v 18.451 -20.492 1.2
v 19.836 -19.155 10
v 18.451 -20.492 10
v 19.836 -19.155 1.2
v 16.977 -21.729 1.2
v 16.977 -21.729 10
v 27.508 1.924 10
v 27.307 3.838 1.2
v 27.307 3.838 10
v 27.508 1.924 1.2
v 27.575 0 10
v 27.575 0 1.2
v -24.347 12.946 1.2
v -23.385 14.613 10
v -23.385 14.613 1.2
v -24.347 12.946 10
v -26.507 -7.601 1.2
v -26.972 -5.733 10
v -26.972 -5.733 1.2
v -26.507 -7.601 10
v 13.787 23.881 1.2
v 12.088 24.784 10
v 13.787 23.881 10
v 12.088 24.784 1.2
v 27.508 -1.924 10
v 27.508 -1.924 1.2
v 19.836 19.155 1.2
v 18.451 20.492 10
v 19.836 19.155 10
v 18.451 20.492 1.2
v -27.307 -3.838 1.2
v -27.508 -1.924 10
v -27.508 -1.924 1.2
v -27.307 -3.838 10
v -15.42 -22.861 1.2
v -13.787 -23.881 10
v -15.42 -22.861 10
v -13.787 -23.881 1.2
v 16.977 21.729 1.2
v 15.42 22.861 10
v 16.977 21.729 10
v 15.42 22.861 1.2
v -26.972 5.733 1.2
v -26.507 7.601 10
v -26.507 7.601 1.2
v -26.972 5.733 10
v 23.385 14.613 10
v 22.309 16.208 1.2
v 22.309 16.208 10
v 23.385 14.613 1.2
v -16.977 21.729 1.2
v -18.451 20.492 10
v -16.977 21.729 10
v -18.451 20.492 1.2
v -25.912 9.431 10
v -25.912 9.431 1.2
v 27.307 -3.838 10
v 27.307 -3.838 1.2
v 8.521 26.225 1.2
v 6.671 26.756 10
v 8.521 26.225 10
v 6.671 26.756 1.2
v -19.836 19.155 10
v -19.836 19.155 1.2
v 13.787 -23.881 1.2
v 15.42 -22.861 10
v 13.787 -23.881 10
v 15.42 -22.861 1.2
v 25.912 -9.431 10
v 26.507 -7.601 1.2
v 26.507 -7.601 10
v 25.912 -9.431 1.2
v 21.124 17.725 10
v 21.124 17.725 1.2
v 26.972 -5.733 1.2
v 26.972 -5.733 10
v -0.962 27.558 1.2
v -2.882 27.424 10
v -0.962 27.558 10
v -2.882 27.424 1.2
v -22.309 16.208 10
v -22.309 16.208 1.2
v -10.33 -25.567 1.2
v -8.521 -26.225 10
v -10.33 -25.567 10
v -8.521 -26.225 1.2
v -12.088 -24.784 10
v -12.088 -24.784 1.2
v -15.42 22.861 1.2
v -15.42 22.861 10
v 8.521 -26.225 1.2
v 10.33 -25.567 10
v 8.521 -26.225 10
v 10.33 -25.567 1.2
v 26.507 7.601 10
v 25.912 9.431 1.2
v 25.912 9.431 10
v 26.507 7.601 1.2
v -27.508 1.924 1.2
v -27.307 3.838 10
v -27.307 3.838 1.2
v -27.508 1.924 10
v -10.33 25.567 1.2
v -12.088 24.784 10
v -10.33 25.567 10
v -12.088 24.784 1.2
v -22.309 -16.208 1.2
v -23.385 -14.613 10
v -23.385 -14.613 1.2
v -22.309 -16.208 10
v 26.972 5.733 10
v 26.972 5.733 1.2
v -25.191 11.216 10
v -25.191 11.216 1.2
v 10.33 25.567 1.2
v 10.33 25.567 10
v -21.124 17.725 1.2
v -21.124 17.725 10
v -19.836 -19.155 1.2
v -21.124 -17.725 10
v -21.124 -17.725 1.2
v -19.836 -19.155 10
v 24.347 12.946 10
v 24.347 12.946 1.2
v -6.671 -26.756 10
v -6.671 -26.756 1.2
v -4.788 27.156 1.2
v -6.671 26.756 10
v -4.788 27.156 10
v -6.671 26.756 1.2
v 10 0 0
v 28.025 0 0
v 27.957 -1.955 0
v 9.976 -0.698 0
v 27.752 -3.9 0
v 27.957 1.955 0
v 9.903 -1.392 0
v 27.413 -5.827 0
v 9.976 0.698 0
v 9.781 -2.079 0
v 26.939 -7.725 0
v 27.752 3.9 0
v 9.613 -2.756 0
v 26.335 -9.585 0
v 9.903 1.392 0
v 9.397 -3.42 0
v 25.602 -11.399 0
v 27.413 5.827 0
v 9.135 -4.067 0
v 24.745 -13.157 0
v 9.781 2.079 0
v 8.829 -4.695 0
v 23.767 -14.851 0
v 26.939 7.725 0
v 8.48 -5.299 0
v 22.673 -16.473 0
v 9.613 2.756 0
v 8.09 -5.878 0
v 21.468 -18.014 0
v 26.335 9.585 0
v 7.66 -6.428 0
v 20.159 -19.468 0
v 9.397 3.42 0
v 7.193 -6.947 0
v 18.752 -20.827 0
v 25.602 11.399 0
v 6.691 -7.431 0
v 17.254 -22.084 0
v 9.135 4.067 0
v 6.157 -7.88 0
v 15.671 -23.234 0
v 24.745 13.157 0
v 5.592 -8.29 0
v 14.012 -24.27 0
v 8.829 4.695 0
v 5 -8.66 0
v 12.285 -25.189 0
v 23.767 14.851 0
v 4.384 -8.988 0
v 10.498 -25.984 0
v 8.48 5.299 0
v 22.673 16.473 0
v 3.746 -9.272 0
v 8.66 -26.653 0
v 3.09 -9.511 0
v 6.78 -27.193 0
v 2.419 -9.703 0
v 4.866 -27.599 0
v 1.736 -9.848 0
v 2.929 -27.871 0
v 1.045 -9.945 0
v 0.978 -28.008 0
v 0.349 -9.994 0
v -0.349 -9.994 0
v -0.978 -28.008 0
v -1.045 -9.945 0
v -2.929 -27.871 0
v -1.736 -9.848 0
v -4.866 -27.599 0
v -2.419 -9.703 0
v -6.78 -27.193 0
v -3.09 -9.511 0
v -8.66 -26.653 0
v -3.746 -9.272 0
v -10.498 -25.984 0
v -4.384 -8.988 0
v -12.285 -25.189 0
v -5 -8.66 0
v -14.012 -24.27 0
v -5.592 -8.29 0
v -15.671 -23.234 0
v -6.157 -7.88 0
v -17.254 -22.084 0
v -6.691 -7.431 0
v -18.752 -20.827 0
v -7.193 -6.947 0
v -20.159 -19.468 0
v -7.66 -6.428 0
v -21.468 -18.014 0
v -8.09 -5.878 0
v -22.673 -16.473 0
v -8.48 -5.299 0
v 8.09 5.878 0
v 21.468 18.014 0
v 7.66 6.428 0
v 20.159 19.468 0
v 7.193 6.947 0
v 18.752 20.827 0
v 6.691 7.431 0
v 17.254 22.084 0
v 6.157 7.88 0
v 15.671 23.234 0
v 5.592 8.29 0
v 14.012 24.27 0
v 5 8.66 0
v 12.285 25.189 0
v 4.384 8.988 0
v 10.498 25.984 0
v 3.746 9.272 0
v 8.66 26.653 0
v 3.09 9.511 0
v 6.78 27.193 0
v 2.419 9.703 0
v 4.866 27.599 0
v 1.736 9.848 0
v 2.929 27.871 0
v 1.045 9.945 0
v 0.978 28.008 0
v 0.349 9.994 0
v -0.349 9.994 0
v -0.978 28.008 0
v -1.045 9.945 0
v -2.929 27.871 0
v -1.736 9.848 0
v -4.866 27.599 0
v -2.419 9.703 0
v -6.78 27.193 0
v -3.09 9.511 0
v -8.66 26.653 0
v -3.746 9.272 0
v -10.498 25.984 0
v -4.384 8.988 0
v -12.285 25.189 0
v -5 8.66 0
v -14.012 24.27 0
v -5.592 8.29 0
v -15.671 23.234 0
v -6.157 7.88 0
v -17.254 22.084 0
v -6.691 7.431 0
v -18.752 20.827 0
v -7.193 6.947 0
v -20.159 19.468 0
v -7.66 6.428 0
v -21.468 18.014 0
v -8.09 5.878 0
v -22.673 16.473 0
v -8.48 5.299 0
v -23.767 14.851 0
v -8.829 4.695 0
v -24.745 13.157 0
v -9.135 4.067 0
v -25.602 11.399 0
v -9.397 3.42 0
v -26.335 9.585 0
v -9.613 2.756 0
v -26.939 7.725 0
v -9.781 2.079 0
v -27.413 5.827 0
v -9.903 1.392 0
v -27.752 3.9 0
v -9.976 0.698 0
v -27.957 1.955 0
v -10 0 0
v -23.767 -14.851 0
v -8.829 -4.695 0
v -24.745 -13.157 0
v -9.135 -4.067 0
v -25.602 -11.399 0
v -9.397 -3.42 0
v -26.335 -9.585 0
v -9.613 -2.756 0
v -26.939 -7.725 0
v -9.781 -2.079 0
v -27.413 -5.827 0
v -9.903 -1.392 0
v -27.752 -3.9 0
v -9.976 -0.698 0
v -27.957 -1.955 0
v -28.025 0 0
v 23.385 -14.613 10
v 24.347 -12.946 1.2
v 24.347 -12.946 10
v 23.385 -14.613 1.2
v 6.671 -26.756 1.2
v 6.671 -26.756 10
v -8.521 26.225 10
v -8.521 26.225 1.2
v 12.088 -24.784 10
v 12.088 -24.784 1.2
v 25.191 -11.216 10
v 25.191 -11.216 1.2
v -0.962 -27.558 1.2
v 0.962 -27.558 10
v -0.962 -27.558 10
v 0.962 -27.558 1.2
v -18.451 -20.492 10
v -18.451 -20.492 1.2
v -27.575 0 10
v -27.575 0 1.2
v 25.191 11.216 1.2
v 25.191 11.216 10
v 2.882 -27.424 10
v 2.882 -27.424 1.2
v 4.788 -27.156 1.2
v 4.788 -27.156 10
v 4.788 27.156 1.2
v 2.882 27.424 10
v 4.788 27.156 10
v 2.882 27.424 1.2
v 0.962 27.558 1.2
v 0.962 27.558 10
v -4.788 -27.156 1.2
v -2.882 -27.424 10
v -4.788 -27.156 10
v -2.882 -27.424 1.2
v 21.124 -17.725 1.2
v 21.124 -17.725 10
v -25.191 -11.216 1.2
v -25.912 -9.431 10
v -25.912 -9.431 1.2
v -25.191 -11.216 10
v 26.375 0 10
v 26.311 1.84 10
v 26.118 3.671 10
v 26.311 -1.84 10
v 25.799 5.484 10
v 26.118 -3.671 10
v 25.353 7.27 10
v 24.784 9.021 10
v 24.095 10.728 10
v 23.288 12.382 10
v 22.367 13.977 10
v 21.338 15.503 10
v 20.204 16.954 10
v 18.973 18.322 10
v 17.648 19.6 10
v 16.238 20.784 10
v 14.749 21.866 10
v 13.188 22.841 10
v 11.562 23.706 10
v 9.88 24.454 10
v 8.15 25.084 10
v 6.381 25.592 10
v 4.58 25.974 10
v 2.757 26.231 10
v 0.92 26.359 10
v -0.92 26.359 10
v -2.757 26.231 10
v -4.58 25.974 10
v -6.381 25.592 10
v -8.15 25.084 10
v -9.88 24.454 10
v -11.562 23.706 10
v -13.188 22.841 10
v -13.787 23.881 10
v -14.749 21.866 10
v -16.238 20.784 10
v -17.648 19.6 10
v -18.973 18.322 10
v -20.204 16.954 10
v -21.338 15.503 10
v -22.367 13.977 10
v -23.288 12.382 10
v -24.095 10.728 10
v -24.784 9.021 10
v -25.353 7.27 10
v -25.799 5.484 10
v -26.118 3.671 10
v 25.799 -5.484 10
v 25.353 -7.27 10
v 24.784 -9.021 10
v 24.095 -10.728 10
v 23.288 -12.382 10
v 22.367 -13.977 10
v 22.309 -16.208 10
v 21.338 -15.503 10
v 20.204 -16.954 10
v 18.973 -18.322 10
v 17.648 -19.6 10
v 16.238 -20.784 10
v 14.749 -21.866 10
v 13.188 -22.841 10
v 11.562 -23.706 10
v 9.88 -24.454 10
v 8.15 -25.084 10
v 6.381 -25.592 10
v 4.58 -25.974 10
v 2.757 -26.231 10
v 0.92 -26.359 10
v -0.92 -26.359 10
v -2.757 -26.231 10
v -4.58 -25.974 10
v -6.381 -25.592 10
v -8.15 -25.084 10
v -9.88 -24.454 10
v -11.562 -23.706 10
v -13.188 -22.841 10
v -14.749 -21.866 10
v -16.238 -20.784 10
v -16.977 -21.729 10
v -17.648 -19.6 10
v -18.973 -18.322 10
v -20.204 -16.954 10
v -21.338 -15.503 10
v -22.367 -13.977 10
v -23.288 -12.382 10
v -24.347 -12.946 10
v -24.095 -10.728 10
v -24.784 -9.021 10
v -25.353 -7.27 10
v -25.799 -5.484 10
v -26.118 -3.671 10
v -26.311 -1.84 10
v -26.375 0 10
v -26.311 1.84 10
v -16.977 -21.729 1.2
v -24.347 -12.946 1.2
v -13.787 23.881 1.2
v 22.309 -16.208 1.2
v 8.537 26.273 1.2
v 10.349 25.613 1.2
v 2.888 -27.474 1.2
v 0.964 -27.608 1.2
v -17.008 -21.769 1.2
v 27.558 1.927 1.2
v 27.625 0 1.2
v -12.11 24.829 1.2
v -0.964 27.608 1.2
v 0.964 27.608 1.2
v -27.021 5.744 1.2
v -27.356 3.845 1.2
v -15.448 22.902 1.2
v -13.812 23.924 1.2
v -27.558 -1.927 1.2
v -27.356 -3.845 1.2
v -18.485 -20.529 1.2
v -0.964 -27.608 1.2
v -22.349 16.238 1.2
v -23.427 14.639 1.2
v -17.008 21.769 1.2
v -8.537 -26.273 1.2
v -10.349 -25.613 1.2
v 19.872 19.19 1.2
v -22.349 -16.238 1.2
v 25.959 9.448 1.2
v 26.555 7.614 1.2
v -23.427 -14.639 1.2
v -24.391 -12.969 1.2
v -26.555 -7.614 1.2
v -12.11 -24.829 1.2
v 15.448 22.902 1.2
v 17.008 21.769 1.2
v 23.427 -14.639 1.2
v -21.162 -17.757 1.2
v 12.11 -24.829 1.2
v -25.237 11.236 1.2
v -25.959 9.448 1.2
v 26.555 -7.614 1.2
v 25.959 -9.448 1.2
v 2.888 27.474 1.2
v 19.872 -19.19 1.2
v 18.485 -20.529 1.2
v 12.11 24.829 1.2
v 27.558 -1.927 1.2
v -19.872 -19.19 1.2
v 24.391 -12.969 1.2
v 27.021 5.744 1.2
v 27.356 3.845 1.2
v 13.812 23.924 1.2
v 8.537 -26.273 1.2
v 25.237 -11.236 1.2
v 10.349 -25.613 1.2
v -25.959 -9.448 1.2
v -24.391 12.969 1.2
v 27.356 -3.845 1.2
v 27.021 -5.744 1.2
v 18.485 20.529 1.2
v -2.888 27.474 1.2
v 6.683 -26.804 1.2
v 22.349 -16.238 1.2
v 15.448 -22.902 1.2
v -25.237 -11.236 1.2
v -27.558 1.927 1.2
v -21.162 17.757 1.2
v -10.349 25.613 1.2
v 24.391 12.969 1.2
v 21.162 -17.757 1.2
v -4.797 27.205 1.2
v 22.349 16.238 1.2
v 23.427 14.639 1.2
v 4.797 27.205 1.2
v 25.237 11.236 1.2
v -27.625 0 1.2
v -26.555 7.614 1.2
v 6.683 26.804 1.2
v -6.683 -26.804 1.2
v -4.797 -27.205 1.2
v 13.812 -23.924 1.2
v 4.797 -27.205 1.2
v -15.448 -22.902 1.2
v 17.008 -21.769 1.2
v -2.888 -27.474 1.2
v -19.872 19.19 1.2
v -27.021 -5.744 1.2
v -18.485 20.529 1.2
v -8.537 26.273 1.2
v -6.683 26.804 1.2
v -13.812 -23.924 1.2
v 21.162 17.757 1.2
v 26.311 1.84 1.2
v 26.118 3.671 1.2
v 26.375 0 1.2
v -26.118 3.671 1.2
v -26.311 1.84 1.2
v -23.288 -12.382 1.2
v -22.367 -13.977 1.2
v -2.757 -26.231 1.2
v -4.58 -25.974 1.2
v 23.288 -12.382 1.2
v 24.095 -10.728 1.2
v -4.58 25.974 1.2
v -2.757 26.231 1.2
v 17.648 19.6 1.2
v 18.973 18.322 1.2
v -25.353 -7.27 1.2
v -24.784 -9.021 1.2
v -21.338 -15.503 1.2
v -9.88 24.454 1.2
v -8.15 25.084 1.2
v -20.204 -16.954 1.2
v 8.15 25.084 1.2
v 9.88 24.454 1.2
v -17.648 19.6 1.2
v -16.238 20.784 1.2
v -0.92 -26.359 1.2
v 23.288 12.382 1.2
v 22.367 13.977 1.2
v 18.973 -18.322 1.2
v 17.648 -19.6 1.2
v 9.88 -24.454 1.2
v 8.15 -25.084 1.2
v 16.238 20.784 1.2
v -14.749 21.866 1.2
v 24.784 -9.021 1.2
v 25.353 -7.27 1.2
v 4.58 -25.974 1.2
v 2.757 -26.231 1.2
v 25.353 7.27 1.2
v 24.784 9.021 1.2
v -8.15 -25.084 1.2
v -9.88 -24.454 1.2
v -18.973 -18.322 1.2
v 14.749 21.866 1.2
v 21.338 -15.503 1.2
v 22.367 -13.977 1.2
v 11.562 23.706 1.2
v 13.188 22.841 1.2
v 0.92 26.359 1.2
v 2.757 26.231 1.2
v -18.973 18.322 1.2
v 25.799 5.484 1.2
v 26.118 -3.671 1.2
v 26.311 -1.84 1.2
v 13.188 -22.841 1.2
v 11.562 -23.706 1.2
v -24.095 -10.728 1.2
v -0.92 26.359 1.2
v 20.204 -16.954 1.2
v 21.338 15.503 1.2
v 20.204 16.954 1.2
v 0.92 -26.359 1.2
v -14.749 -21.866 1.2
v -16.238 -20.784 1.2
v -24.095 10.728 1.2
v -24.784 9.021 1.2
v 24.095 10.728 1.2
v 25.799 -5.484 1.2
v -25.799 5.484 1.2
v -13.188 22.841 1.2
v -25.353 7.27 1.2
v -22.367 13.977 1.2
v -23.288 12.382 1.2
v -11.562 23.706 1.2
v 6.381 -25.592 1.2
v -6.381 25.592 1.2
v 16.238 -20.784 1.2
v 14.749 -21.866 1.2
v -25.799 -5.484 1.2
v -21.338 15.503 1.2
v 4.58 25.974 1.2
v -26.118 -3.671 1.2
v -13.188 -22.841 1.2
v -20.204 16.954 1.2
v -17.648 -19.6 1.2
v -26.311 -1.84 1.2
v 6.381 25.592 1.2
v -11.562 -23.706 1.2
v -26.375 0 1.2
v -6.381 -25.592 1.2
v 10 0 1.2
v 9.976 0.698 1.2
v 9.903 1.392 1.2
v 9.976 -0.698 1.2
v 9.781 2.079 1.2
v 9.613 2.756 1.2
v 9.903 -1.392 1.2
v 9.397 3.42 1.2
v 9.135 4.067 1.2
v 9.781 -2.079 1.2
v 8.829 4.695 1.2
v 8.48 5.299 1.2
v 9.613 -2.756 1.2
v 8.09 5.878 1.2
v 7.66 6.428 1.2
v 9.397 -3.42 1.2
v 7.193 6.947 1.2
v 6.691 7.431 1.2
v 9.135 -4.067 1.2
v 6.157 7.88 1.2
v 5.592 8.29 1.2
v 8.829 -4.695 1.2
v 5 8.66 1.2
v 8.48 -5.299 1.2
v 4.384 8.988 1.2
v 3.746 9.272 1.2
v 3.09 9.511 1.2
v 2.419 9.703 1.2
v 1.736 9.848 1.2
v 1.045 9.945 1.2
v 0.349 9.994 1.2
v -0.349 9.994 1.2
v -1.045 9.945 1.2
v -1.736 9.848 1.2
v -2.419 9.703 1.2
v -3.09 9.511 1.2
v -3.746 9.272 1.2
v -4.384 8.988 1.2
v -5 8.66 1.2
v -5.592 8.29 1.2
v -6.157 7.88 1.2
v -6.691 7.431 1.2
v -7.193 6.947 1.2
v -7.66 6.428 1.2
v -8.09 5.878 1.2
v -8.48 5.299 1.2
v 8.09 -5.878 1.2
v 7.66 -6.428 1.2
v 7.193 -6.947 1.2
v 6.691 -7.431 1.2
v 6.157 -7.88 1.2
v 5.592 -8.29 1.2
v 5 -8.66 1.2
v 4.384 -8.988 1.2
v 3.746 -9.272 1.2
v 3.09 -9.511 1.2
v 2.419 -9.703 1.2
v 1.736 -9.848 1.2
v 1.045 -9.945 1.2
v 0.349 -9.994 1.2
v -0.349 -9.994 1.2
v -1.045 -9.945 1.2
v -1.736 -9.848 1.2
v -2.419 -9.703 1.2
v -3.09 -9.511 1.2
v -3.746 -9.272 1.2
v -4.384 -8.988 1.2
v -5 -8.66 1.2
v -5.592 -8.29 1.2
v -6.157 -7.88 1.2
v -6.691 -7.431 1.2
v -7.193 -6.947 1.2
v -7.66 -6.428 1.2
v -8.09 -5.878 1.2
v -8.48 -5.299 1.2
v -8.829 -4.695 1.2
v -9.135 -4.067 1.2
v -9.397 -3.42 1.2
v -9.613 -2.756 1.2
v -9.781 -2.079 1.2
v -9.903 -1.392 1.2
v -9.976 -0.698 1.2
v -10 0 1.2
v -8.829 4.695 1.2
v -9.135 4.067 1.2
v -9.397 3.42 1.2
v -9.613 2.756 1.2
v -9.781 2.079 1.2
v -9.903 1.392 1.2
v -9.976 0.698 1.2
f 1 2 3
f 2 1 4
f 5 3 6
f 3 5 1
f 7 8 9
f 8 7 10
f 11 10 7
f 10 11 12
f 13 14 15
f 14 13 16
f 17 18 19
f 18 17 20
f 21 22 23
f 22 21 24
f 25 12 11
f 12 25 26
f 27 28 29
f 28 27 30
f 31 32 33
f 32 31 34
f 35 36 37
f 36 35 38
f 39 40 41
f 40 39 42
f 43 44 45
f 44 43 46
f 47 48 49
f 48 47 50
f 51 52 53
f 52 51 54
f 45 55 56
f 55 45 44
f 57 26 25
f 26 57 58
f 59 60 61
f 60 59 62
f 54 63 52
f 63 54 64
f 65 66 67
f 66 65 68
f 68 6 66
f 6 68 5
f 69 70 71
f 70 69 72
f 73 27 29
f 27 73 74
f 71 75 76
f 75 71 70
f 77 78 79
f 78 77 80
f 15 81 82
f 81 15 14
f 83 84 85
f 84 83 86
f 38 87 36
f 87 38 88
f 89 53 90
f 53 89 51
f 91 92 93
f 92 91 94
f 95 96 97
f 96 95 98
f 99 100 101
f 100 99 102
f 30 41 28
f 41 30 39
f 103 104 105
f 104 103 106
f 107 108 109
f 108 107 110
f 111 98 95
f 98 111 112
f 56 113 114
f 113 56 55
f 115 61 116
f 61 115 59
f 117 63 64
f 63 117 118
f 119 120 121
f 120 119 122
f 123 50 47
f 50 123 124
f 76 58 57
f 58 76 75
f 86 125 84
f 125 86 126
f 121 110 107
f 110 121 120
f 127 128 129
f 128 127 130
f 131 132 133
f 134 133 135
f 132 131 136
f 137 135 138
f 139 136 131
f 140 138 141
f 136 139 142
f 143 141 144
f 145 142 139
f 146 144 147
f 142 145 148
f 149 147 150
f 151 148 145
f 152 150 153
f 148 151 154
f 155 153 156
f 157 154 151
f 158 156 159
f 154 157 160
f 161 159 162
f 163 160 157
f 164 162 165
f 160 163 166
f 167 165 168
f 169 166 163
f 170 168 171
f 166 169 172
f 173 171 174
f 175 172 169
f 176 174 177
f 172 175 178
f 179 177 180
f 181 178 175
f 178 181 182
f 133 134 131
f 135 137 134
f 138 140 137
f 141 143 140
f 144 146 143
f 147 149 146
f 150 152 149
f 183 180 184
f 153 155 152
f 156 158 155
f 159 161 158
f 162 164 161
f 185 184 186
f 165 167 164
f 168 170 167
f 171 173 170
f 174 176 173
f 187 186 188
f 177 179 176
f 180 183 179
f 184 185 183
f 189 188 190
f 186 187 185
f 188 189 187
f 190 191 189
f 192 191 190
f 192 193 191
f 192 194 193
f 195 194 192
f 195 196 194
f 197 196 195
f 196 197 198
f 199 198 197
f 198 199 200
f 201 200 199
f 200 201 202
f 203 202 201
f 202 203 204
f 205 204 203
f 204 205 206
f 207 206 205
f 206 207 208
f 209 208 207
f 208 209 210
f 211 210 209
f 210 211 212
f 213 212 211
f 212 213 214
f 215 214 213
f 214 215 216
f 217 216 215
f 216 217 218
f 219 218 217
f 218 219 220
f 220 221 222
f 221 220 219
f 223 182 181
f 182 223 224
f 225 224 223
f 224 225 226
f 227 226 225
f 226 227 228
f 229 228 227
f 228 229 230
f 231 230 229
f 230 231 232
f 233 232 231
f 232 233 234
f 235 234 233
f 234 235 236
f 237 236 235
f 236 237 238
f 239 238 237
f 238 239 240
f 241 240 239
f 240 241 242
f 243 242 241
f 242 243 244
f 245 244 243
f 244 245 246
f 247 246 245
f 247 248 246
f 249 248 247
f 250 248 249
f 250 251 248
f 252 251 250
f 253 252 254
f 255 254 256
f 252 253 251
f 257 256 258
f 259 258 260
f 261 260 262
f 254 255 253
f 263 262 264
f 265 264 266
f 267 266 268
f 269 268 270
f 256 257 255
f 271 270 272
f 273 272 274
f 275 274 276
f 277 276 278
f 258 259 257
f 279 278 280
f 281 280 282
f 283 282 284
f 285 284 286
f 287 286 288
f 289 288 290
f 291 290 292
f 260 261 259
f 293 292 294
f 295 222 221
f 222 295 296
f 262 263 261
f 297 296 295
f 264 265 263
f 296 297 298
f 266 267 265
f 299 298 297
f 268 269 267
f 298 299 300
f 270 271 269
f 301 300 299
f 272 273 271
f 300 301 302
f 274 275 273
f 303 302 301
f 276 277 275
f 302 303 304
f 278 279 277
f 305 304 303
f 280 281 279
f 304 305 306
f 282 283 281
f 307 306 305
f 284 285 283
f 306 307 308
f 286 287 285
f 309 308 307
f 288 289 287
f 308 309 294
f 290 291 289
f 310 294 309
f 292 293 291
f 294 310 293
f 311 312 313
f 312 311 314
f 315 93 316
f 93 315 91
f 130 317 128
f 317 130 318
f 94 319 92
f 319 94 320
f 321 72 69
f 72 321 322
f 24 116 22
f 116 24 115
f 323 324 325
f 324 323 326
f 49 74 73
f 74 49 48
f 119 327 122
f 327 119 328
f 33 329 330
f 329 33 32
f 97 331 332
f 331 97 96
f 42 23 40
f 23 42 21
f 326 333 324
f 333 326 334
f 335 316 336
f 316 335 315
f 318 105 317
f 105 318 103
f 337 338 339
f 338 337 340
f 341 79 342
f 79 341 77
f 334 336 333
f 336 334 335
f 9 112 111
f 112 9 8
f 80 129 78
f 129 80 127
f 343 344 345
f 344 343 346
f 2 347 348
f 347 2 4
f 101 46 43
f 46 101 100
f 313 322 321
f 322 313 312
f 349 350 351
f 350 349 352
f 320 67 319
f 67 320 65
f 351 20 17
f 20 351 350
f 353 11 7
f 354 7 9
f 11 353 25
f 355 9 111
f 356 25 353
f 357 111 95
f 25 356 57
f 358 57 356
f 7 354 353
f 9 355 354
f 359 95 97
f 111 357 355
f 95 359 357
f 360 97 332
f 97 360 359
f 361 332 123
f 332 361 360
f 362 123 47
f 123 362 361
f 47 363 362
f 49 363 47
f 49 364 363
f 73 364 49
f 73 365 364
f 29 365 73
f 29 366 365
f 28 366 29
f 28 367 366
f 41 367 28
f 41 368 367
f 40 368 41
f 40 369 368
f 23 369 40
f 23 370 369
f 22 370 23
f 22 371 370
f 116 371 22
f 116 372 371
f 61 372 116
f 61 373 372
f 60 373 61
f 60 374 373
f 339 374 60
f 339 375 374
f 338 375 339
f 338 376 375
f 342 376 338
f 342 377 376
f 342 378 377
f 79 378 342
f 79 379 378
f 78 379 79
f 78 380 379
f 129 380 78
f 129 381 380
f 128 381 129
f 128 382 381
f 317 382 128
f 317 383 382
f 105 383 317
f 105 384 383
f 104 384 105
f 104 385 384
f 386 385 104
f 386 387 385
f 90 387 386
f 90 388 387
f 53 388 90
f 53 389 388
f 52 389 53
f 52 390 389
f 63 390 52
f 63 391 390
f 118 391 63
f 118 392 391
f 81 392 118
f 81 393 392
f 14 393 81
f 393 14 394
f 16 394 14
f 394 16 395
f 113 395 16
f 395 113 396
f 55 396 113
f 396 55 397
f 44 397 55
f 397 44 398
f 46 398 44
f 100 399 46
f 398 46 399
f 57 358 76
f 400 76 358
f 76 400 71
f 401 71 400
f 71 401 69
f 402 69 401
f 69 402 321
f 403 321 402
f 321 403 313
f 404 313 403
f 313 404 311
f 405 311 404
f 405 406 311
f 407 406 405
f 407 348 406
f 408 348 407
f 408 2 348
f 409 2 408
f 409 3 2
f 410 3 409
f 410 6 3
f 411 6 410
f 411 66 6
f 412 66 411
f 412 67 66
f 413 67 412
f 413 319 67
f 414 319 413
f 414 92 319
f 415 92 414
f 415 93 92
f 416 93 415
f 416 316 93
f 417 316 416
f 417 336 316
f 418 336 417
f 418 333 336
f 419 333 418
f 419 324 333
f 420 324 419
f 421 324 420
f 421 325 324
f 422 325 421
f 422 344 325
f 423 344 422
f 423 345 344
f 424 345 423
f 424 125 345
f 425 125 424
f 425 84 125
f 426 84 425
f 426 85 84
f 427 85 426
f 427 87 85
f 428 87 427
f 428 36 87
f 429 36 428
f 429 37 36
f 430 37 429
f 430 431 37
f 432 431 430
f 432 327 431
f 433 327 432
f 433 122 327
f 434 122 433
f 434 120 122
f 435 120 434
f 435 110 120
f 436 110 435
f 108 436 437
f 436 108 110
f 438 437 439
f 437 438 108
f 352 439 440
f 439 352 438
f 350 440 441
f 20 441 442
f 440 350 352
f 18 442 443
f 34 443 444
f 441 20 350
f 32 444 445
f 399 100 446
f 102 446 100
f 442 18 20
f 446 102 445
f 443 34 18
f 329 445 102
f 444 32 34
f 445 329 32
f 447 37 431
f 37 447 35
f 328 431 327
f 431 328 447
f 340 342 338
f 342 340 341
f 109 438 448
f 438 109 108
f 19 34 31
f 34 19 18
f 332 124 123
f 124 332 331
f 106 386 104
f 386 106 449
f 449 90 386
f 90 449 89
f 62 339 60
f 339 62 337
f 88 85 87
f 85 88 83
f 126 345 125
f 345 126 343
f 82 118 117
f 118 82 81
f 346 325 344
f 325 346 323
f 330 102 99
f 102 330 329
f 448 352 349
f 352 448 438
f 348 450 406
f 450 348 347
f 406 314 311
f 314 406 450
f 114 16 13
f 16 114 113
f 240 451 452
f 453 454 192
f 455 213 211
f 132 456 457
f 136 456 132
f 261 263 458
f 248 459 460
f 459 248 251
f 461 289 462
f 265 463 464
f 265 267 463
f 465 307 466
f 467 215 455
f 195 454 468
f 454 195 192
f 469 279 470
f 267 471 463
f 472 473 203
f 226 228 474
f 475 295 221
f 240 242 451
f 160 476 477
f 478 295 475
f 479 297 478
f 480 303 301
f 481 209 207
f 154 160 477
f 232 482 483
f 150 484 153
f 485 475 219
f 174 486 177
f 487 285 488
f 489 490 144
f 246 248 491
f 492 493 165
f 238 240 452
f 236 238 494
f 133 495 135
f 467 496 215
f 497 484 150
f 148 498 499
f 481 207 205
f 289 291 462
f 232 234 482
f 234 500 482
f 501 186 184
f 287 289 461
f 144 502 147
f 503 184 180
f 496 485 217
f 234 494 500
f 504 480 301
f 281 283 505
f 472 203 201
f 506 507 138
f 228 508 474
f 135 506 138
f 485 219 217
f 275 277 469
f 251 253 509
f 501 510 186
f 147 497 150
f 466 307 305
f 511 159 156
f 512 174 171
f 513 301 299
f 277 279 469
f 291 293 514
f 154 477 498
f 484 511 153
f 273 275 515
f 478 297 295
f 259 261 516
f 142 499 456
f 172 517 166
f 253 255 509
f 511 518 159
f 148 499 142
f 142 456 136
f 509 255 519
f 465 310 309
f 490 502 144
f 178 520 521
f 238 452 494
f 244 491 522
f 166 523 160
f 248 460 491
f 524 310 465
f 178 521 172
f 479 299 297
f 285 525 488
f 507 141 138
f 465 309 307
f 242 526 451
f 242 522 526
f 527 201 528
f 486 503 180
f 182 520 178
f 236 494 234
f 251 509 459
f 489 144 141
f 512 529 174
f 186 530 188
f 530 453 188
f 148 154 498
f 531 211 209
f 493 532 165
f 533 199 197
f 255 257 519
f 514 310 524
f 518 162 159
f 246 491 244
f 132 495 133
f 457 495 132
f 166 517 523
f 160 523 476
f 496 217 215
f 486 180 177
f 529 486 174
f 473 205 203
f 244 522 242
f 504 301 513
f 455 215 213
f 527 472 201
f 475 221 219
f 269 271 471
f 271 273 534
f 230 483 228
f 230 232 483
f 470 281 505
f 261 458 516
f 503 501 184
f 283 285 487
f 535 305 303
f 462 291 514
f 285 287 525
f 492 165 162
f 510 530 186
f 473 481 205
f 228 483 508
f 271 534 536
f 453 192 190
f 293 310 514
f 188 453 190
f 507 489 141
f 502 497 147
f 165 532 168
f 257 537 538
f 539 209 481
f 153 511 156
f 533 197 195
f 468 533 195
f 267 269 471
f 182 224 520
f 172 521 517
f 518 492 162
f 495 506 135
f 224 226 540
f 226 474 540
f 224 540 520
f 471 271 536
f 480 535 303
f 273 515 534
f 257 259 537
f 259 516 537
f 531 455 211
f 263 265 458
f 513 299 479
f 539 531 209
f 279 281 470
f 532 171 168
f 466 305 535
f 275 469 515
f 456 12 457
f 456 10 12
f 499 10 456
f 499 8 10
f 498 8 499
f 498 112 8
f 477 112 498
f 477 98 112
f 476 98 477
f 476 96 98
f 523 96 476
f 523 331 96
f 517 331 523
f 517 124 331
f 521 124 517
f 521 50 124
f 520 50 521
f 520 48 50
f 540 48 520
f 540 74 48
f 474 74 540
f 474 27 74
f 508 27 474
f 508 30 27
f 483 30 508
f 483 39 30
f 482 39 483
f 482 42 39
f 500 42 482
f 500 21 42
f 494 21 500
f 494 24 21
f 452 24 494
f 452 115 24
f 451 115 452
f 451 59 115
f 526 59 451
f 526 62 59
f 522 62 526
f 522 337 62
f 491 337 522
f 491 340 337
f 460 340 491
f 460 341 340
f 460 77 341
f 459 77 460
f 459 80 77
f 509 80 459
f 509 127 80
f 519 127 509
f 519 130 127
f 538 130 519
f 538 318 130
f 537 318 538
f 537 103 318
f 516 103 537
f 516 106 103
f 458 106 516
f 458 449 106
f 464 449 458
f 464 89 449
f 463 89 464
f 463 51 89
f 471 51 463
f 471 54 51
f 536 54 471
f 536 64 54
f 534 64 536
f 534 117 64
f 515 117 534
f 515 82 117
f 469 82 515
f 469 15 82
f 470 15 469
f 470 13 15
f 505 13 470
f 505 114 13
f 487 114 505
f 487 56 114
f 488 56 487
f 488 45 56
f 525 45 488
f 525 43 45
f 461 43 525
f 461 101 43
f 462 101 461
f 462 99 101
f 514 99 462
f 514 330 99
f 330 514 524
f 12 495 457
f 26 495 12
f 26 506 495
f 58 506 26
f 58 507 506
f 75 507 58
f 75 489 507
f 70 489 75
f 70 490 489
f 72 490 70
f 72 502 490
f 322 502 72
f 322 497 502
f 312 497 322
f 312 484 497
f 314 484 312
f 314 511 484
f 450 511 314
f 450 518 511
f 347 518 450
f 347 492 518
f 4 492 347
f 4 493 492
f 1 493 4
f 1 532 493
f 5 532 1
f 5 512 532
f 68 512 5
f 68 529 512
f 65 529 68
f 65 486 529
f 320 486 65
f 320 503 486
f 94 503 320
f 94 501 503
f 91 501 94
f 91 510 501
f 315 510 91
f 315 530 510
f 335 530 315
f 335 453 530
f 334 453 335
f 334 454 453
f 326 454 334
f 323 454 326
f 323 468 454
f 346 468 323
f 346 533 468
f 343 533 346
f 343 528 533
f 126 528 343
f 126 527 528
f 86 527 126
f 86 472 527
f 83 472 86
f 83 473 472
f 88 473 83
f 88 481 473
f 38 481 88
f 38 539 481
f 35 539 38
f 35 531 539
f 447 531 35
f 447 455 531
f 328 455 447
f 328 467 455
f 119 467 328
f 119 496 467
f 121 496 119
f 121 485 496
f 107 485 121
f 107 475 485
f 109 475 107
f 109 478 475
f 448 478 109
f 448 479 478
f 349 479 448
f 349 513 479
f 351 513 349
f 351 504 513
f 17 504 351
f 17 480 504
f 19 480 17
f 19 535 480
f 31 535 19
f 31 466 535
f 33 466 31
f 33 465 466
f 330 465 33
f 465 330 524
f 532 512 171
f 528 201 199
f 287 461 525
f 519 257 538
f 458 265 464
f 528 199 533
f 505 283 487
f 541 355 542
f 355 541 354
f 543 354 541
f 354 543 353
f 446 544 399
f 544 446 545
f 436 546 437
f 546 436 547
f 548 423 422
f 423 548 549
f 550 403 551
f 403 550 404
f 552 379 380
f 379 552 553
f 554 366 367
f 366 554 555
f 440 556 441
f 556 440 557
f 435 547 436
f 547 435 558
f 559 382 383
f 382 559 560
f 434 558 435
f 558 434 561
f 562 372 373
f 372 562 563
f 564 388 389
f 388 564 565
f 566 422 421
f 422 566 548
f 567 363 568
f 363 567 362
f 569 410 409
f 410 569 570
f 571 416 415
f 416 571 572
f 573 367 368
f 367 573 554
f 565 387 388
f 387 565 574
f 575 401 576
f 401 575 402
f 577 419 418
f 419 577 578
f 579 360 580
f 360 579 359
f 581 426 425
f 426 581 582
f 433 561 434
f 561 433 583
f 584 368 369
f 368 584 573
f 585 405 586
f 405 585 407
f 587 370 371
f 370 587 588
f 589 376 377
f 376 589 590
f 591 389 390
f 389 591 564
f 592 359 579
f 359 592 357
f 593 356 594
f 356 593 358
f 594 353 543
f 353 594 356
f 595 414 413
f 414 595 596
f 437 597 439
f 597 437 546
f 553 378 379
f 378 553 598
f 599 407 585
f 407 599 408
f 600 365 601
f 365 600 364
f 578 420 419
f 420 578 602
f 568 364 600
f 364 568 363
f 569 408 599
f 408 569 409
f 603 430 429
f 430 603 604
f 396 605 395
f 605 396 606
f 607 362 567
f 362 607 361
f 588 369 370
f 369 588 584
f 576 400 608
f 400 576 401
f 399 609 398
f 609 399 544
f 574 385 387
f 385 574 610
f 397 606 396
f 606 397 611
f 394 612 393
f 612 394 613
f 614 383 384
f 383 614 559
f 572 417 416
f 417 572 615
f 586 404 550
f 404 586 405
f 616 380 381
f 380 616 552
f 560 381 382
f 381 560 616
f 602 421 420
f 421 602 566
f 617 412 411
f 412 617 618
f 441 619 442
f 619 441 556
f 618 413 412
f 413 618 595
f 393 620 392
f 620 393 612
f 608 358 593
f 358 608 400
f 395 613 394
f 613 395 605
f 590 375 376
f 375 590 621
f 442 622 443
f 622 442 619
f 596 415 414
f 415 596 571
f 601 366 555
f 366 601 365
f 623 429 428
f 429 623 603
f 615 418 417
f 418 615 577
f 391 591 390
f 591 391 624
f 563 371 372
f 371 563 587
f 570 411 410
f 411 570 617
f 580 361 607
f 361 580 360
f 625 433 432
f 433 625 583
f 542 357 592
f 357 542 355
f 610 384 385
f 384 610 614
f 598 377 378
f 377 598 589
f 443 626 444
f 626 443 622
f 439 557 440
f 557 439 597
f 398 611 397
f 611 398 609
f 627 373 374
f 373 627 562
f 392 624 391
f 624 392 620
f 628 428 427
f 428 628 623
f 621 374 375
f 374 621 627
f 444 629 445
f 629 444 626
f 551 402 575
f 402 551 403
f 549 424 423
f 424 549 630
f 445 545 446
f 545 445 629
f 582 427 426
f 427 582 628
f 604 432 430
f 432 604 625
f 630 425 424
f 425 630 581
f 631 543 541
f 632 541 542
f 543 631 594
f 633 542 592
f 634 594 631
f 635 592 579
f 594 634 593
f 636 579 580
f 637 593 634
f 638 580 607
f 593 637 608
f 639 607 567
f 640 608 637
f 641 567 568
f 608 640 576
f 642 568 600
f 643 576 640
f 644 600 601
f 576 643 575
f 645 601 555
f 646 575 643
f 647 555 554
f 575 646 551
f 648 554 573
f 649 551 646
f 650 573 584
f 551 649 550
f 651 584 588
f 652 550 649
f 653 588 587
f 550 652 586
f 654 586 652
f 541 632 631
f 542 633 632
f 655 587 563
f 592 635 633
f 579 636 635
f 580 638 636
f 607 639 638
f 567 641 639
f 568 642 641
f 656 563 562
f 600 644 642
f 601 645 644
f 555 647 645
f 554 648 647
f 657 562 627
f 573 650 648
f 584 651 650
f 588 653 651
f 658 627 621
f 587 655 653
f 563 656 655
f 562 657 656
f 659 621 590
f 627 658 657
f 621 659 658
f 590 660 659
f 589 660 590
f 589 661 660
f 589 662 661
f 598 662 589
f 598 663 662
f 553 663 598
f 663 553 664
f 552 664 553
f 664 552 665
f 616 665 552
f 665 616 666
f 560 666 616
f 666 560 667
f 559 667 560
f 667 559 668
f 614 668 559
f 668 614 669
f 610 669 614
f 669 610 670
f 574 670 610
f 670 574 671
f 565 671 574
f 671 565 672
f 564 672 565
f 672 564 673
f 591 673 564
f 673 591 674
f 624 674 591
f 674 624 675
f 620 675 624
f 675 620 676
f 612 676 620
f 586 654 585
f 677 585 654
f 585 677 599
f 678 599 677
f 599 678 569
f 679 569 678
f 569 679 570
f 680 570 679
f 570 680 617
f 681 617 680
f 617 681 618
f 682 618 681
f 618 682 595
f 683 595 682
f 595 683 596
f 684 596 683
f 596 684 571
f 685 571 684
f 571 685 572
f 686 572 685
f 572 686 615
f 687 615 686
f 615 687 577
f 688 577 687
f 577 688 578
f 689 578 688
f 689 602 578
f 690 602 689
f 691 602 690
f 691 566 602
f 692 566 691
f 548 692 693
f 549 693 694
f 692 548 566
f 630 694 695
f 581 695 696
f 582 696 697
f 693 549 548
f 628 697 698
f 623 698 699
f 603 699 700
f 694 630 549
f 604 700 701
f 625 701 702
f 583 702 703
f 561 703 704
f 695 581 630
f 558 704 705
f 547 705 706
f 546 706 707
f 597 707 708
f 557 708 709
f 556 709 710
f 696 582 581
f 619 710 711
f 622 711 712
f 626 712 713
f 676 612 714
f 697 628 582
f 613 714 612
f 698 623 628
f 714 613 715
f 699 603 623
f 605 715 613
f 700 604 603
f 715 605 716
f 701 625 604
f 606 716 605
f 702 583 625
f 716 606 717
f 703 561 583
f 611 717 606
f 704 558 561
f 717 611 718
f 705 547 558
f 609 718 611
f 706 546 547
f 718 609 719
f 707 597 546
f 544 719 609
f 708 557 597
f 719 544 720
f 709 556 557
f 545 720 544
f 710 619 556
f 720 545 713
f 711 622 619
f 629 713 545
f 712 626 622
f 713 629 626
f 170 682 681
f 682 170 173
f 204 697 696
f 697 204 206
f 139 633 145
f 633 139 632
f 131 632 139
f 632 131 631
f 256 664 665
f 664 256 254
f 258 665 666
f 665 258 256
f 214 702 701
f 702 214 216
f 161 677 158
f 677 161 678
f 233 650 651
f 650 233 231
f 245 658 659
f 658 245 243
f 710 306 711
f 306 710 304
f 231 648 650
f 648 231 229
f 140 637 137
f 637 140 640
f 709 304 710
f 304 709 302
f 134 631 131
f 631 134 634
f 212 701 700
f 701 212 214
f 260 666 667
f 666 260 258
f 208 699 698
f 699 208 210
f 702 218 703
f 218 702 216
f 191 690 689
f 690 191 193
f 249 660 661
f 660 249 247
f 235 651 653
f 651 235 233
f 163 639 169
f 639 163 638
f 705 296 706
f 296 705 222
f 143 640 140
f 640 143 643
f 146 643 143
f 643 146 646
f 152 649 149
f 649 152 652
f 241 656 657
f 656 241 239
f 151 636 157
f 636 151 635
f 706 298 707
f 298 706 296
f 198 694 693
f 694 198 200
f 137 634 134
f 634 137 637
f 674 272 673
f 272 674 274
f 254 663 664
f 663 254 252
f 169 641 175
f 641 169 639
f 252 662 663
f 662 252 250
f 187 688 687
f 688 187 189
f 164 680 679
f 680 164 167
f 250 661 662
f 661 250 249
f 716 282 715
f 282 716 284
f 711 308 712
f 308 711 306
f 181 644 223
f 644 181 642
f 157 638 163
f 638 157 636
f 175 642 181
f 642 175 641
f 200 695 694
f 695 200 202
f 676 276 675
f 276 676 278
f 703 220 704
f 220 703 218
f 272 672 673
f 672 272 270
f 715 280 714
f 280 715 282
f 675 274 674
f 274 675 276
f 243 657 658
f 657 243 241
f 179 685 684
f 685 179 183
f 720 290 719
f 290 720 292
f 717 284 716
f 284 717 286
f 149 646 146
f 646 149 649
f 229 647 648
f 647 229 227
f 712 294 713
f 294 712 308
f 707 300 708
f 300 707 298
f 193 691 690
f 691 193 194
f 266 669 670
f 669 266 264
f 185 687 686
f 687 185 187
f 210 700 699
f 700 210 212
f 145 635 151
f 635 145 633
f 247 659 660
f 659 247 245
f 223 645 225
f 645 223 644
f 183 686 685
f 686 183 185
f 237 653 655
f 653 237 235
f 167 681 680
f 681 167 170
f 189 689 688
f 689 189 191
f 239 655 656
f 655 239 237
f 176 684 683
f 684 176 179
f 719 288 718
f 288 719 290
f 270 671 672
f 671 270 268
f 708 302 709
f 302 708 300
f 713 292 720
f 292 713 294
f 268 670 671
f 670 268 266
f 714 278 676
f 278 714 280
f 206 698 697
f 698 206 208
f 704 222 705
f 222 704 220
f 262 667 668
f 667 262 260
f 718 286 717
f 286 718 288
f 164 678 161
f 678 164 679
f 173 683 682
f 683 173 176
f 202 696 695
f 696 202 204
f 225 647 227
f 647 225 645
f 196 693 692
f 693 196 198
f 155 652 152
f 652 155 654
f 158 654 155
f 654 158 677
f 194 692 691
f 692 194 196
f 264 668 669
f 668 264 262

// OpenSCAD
// file: _common.scad
$fa=4; // default minimum facet angle is now 0.5
$fs=0.05; // default minimum facet size is now 0.05 mm

innerRad = 80/2;
outerRad = 199/2;
depth = 60;
height = 61.5;

m3TapRad = 1.3;
screwHoleXDistance = 4;
screwHoleYDistance = 8.25;

detentRad = 3.3/2;

wallThickness = 1.2;

fingerHoleRad = 10;

holeRad = 55.25/2;
holeRadOffset = .05;

dowelRad = 12.25 / 2;
// main file
include <_common.scad>;

hole = true;

difference() {
  union() {
    cylinder(r = holeRad - holeRadOffset, h = 10);
    cylinder(r1 = holeRad + wallThickness / 3, r2 = holeRad, h = wallThickness);
  }
  translate([0, 0, wallThickness]) cylinder(r = holeRad - holeRadOffset - wallThickness, h = 10);
  if (hole) {
    translate([0, 0, -.01]) cylinder(r = fingerHoleRad, h = wallThickness + .02);
  }
}
